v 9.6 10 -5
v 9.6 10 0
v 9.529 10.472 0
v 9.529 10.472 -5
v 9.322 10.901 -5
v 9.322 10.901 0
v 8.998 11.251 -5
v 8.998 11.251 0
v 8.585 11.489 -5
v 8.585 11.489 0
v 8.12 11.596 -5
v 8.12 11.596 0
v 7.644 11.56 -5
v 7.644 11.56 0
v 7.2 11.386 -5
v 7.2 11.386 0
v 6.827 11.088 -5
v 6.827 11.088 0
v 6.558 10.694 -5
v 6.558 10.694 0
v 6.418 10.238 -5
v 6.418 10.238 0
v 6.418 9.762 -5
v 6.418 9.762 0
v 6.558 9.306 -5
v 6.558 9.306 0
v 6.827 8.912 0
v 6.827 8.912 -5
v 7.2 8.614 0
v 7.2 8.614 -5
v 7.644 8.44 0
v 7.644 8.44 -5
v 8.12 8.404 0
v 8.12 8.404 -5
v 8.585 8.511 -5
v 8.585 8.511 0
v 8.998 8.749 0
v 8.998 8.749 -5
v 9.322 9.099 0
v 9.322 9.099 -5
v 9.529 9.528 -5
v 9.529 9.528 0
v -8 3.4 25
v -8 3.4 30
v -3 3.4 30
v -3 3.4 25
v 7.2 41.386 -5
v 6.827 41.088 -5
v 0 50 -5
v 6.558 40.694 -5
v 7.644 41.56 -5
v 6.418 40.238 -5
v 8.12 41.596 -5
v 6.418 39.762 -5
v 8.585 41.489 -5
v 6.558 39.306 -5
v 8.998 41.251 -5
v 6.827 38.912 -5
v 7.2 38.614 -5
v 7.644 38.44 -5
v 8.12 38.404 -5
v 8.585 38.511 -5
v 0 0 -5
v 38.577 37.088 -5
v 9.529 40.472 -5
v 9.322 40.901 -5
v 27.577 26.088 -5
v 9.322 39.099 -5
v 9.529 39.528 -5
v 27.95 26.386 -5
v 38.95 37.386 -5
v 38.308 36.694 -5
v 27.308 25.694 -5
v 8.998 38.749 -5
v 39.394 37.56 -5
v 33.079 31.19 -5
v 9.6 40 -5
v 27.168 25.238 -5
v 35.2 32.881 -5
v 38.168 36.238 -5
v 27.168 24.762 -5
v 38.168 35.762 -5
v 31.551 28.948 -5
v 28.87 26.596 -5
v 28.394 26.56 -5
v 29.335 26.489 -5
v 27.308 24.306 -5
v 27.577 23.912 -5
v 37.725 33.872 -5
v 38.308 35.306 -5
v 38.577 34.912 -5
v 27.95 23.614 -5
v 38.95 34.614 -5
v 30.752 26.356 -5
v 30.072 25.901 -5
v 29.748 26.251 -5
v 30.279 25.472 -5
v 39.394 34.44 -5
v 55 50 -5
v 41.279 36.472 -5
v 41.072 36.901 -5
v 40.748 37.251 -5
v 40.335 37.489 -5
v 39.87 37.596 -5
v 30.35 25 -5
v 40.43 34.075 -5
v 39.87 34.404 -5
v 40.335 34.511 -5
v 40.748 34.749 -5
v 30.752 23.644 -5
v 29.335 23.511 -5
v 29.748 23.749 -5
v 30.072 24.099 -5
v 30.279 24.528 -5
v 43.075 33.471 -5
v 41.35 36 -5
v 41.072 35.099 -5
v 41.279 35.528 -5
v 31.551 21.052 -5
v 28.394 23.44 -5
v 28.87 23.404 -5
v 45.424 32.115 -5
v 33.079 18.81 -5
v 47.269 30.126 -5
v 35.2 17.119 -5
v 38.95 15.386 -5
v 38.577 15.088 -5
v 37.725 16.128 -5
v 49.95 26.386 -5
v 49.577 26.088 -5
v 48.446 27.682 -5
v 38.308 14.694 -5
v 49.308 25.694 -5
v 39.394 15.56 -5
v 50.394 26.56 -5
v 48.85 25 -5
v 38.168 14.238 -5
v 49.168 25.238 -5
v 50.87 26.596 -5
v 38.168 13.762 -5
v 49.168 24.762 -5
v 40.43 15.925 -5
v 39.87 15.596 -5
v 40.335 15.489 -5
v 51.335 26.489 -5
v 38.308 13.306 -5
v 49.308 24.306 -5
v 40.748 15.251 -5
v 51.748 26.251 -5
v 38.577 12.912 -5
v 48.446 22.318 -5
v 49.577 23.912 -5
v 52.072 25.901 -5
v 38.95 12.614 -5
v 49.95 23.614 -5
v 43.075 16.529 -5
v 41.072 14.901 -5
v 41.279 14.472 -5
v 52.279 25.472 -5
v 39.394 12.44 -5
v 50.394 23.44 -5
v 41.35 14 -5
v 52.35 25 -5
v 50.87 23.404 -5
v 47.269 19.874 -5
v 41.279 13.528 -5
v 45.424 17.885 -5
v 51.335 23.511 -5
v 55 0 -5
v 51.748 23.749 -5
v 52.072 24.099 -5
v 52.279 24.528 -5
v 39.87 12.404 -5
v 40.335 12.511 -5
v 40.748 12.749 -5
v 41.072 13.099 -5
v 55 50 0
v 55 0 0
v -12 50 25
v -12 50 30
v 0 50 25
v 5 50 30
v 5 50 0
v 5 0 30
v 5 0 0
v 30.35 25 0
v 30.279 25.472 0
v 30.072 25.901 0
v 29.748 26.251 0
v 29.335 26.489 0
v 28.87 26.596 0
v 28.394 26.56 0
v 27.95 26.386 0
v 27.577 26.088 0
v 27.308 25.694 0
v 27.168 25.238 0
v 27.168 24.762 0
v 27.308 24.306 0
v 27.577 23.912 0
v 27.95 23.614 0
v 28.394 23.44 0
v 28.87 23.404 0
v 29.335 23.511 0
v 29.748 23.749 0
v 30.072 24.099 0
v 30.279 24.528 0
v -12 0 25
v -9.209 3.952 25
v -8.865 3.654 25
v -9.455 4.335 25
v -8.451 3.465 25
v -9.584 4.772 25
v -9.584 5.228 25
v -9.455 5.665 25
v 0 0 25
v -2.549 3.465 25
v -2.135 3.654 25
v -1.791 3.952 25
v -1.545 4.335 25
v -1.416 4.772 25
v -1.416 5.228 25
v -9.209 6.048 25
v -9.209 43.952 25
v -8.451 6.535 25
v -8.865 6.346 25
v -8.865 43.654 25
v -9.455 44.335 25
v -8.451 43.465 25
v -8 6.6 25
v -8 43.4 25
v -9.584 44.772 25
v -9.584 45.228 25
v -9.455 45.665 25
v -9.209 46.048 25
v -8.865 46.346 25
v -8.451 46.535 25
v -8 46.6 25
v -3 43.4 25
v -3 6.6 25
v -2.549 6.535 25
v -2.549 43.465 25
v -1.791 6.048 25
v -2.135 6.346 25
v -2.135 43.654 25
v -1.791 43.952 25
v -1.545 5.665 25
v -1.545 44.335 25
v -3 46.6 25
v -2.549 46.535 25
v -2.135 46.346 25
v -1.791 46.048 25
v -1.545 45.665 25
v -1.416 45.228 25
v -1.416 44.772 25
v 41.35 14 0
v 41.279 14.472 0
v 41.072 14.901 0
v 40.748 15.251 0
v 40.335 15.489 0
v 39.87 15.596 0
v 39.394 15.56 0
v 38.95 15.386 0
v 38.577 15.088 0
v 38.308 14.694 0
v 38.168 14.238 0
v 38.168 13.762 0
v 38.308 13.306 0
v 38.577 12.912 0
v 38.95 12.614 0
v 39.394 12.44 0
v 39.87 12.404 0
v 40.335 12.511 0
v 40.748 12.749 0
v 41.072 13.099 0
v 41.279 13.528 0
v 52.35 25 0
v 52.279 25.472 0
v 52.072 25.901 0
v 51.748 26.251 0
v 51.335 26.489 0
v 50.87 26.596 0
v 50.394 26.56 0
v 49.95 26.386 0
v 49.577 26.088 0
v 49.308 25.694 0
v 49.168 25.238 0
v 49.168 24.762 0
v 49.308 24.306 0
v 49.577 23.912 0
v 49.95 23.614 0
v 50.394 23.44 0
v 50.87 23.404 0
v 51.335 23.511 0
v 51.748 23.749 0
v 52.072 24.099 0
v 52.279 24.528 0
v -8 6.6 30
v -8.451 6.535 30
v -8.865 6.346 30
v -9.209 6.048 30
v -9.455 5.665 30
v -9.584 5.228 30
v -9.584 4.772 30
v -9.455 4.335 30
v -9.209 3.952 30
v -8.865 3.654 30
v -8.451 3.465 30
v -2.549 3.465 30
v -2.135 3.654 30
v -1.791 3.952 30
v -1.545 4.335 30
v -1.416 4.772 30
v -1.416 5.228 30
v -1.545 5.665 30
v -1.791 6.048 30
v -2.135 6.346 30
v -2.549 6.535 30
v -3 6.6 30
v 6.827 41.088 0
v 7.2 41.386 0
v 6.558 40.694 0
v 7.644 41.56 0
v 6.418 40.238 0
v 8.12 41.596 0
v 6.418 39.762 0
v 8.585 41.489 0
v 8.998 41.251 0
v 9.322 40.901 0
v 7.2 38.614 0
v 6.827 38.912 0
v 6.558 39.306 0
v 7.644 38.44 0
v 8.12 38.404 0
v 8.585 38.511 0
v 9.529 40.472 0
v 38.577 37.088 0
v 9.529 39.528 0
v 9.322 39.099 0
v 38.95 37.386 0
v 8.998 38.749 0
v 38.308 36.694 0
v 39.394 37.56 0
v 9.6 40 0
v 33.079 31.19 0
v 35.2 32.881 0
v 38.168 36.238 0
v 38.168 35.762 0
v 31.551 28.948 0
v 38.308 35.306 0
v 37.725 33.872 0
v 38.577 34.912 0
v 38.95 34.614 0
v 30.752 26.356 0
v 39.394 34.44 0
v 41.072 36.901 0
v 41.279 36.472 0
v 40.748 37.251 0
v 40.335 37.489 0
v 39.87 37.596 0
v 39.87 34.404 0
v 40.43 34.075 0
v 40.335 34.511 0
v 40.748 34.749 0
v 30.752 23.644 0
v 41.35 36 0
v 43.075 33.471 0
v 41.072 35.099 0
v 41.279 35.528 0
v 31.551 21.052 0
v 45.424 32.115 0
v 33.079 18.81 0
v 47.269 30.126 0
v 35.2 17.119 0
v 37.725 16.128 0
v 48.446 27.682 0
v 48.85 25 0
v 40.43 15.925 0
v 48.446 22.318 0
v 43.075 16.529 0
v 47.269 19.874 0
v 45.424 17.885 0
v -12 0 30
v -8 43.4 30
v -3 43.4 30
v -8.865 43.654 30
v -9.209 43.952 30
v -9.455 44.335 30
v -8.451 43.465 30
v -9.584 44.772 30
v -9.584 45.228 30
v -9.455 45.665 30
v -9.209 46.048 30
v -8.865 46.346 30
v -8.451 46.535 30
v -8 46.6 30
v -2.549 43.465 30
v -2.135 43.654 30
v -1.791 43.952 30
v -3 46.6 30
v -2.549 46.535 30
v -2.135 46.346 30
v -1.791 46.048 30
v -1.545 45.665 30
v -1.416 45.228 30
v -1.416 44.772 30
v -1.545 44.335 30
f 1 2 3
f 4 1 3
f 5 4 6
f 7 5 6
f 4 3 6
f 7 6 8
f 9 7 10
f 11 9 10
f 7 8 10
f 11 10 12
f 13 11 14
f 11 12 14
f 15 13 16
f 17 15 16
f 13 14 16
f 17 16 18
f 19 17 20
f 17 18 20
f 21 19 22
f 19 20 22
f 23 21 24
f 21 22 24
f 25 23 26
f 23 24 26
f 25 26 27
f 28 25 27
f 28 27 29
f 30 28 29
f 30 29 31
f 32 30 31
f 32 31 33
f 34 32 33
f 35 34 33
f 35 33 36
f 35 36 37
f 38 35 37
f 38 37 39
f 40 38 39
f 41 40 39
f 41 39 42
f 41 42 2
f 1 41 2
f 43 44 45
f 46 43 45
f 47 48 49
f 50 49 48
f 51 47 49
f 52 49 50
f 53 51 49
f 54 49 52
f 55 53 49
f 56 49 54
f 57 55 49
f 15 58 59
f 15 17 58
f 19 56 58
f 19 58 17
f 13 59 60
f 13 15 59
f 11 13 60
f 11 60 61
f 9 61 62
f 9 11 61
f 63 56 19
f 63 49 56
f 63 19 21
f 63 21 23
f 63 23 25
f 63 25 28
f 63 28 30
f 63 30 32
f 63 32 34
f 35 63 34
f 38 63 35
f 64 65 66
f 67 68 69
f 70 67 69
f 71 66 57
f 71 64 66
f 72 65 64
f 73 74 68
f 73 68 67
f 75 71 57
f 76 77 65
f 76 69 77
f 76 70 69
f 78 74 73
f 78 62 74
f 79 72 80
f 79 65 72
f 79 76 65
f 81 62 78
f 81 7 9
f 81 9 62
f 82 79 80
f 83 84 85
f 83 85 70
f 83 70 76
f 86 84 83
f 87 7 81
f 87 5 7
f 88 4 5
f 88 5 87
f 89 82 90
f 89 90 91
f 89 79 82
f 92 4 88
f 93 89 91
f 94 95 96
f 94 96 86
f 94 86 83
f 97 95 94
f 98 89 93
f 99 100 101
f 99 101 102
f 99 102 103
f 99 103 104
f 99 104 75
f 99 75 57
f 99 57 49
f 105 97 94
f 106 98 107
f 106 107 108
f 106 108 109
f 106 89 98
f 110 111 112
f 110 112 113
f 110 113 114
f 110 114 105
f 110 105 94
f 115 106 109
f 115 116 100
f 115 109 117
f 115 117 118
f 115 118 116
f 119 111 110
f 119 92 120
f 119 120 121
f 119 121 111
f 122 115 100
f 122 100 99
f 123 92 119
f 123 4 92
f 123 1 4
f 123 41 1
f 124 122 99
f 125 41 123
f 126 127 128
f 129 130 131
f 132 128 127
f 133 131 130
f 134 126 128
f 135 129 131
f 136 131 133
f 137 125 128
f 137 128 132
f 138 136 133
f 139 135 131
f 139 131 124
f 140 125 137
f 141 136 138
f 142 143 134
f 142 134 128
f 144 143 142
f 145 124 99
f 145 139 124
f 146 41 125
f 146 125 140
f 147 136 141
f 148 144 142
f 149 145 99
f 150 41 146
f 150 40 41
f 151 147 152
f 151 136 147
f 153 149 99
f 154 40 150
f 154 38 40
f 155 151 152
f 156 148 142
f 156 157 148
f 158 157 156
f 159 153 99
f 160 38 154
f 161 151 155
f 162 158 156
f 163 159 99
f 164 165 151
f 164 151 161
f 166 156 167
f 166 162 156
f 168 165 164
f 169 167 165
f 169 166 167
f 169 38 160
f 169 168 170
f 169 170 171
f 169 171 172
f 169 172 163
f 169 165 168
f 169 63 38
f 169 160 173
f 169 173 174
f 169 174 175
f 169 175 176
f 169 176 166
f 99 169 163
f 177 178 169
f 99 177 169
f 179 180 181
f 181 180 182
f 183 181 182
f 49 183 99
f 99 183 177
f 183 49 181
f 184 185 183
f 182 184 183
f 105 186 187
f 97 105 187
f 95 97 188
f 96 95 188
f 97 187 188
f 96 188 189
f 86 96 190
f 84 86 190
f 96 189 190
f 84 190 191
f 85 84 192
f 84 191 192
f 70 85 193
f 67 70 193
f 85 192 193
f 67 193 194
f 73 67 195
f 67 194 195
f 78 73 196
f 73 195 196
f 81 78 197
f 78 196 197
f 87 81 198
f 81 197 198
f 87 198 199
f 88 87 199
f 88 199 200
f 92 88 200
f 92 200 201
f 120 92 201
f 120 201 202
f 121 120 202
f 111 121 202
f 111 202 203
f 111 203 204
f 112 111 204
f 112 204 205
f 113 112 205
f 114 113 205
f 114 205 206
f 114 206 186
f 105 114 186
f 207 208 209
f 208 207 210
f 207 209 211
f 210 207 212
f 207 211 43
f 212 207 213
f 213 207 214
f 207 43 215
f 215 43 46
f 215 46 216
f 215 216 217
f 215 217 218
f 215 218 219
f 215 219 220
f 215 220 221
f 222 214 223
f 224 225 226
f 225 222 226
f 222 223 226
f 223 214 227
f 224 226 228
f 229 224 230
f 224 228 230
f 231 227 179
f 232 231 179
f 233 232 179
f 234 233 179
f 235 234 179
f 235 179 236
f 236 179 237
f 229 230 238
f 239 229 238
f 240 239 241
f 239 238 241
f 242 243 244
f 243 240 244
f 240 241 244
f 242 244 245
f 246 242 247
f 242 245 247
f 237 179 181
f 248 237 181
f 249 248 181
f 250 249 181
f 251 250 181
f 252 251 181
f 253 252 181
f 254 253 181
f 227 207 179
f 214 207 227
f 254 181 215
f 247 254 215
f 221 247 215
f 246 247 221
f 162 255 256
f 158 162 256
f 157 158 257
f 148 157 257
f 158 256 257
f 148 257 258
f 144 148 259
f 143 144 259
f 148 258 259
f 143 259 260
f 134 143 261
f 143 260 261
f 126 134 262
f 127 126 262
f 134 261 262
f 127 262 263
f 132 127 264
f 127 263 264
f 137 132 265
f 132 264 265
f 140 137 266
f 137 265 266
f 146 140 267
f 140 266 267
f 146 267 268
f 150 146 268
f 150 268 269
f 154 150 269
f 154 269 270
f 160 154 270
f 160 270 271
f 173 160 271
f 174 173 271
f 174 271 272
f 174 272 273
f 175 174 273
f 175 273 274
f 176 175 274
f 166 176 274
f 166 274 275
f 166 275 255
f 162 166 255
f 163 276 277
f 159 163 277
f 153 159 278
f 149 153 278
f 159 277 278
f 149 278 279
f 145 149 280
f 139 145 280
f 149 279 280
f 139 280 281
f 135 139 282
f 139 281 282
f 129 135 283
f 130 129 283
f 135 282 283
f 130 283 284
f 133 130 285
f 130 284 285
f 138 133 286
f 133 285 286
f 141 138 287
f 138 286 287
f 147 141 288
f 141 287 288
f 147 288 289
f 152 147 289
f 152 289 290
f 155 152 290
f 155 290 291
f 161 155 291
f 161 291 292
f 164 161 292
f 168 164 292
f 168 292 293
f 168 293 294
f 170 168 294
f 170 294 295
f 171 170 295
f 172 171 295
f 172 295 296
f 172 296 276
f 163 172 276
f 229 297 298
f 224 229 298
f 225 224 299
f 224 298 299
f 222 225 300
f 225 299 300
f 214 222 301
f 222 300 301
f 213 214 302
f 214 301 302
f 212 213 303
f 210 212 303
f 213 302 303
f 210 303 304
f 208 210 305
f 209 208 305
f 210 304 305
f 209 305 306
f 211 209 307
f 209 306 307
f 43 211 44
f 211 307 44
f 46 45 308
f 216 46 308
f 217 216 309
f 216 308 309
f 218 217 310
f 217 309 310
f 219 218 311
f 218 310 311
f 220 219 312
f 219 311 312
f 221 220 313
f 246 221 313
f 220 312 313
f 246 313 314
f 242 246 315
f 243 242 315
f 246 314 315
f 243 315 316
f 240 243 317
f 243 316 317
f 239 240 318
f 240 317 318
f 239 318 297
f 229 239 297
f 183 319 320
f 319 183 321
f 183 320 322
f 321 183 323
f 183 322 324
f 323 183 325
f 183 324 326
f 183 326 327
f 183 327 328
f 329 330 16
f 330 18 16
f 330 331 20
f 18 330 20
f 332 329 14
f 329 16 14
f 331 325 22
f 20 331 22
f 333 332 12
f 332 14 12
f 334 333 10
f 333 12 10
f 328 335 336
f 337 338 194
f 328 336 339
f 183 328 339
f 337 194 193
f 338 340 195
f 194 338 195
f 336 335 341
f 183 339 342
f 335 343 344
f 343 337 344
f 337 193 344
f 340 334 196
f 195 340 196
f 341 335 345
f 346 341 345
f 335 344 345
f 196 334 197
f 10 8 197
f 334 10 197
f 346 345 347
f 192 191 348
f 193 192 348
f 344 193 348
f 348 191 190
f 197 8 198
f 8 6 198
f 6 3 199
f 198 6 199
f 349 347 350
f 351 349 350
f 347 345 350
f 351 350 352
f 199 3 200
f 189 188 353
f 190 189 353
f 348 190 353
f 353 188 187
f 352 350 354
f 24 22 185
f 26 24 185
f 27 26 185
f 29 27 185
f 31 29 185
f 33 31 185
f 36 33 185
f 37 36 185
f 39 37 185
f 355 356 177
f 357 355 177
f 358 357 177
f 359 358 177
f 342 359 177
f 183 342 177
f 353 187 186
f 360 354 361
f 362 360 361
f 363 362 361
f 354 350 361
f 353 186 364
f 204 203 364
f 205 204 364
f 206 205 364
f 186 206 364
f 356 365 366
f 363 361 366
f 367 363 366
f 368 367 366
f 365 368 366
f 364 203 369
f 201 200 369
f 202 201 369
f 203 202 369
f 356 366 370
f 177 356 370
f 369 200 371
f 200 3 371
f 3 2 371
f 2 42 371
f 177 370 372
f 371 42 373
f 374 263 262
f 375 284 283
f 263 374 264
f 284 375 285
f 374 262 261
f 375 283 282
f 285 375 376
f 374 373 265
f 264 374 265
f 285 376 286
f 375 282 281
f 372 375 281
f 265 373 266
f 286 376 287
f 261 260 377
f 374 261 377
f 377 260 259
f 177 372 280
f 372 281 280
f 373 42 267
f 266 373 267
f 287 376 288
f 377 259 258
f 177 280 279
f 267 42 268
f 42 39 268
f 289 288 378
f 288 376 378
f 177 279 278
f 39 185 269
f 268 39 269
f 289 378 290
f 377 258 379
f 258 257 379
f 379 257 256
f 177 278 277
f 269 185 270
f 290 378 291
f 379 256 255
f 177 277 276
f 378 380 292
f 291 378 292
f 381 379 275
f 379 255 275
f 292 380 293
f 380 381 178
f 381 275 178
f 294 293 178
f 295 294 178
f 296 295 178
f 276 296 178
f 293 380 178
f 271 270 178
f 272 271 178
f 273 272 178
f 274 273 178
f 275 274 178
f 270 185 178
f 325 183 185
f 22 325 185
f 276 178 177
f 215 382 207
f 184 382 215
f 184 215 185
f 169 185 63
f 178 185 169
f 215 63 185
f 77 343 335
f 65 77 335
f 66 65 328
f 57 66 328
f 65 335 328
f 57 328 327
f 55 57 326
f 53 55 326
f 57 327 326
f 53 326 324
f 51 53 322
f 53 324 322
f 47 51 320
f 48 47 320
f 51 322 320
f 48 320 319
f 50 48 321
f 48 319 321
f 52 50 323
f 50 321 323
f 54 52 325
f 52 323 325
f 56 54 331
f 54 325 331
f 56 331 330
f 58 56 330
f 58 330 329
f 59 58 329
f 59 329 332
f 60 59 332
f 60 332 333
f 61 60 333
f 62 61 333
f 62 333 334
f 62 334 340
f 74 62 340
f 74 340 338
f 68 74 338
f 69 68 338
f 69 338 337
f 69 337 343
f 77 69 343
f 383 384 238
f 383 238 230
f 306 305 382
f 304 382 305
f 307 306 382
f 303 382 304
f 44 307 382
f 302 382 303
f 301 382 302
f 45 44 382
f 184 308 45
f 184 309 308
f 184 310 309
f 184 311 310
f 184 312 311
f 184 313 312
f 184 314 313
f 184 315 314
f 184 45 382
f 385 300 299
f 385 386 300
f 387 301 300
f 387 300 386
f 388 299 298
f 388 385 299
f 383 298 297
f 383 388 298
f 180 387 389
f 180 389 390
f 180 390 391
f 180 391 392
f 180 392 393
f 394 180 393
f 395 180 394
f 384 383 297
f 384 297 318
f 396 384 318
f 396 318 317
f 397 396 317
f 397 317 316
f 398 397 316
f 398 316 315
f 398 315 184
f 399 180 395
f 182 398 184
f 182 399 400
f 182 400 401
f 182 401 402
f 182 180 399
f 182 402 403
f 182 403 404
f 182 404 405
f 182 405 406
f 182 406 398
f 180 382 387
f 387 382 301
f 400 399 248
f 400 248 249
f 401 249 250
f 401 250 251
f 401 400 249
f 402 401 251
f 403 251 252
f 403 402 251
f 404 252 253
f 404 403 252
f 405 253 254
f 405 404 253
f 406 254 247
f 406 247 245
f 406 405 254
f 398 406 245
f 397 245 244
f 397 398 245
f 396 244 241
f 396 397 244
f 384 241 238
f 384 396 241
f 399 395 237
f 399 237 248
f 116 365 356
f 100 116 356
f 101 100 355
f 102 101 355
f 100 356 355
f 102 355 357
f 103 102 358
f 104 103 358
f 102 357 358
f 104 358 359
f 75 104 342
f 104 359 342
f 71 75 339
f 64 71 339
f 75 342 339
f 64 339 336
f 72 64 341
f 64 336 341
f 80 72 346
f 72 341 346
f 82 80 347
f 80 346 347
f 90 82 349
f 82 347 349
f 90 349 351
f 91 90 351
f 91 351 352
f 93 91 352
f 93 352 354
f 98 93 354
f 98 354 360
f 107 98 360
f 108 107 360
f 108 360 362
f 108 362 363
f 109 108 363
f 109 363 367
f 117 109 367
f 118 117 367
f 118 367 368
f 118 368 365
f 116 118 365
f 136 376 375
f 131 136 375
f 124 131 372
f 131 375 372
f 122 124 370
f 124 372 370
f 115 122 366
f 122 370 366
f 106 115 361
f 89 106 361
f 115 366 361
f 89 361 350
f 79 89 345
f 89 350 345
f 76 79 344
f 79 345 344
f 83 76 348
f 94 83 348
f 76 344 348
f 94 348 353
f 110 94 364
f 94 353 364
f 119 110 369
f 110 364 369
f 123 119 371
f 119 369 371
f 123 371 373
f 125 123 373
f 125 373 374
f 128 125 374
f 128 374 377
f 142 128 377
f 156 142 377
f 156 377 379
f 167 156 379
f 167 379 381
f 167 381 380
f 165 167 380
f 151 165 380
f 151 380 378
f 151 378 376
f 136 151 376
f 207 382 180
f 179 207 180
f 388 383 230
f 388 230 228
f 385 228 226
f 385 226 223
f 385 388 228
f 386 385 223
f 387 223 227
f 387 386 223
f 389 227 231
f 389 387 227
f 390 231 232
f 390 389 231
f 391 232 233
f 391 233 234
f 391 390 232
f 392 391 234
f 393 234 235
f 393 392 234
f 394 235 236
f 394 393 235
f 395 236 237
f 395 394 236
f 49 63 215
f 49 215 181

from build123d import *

# Parameters (mm, degrees)
SKETCH1_W           = 55
SKETCH1_H           = 5
BOSS_EXTRUDE1_DEPTH = 50
SKETCH2_R           = 9.1
SKETCH2_R_2         = 1.6
CUT_EXTRUDE1_DEPTH  = 75.498322129
SKETCH3_W           = 5
SKETCH3_H           = 50
BOSS_EXTRUDE2_DEPTH = 30
SKETCH4_W           = 17
SKETCH4_H           = 50
BOSS_EXTRUDE3_DEPTH = 5


with BuildPart() as part:
    # Sketch1 → Boss-Extrude1 (new body)
    with BuildSketch(Plane(origin=(0, 0, 0), x_dir=(1, 0, 0), z_dir=(0, 1, 0))):
        with Locations((27.5, 2.5)):
            Rectangle(SKETCH1_W, SKETCH1_H)
    extrude(amount=BOSS_EXTRUDE1_DEPTH)

    # Sketch2 → Cut-Extrude1 (cut, through all)
    with BuildSketch(Plane.XY):
        with Locations((39.75, 25)):
            Circle(SKETCH2_R)
        with Locations((39.75, 36)):
            Circle(SKETCH2_R_2)
        with Locations((50.75, 25)):
            Circle(SKETCH2_R_2)
        with Locations((39.75, 14)):
            Circle(SKETCH2_R_2)
        with Locations((28.75, 25)):
            Circle(SKETCH2_R_2)
        with Locations((8, 40)):
            Circle(SKETCH2_R_2)
        with Locations((8, 10)):
            Circle(SKETCH2_R_2)
    extrude(amount=-CUT_EXTRUDE1_DEPTH, mode=Mode.SUBTRACT)

    # Sketch3 → Boss-Extrude2 (add)
    with BuildSketch(Plane.XY):
        with Locations((2.5, 25)):
            Rectangle(SKETCH3_W, SKETCH3_H)
    extrude(amount=BOSS_EXTRUDE2_DEPTH)

    # Sketch4 → Boss-Extrude3 (add)
    with BuildSketch(Plane.XY.offset(30)):
        with Locations((-3.5, 25)):
            Rectangle(SKETCH4_W, SKETCH4_H)
        with BuildLine():
            Line((-8, 46.6), (-3, 46.6))
            ThreePointArc((-3, 46.6), (-1.4, 45), (-3, 43.4))
            Line((-3, 43.4), (-8, 43.4))
            ThreePointArc((-8, 43.4), (-9.6, 45), (-8, 46.6))
        make_face(mode=Mode.SUBTRACT)
        with BuildLine():
            Line((-8, 3.4), (-3, 3.4))
            ThreePointArc((-3, 3.4), (-1.4, 5), (-3, 6.6))
            Line((-3, 6.6), (-8, 6.6))
            ThreePointArc((-8, 6.6), (-9.6, 5), (-8, 3.4))
        make_face(mode=Mode.SUBTRACT)
    extrude(amount=-BOSS_EXTRUDE3_DEPTH)


solid = part.part
